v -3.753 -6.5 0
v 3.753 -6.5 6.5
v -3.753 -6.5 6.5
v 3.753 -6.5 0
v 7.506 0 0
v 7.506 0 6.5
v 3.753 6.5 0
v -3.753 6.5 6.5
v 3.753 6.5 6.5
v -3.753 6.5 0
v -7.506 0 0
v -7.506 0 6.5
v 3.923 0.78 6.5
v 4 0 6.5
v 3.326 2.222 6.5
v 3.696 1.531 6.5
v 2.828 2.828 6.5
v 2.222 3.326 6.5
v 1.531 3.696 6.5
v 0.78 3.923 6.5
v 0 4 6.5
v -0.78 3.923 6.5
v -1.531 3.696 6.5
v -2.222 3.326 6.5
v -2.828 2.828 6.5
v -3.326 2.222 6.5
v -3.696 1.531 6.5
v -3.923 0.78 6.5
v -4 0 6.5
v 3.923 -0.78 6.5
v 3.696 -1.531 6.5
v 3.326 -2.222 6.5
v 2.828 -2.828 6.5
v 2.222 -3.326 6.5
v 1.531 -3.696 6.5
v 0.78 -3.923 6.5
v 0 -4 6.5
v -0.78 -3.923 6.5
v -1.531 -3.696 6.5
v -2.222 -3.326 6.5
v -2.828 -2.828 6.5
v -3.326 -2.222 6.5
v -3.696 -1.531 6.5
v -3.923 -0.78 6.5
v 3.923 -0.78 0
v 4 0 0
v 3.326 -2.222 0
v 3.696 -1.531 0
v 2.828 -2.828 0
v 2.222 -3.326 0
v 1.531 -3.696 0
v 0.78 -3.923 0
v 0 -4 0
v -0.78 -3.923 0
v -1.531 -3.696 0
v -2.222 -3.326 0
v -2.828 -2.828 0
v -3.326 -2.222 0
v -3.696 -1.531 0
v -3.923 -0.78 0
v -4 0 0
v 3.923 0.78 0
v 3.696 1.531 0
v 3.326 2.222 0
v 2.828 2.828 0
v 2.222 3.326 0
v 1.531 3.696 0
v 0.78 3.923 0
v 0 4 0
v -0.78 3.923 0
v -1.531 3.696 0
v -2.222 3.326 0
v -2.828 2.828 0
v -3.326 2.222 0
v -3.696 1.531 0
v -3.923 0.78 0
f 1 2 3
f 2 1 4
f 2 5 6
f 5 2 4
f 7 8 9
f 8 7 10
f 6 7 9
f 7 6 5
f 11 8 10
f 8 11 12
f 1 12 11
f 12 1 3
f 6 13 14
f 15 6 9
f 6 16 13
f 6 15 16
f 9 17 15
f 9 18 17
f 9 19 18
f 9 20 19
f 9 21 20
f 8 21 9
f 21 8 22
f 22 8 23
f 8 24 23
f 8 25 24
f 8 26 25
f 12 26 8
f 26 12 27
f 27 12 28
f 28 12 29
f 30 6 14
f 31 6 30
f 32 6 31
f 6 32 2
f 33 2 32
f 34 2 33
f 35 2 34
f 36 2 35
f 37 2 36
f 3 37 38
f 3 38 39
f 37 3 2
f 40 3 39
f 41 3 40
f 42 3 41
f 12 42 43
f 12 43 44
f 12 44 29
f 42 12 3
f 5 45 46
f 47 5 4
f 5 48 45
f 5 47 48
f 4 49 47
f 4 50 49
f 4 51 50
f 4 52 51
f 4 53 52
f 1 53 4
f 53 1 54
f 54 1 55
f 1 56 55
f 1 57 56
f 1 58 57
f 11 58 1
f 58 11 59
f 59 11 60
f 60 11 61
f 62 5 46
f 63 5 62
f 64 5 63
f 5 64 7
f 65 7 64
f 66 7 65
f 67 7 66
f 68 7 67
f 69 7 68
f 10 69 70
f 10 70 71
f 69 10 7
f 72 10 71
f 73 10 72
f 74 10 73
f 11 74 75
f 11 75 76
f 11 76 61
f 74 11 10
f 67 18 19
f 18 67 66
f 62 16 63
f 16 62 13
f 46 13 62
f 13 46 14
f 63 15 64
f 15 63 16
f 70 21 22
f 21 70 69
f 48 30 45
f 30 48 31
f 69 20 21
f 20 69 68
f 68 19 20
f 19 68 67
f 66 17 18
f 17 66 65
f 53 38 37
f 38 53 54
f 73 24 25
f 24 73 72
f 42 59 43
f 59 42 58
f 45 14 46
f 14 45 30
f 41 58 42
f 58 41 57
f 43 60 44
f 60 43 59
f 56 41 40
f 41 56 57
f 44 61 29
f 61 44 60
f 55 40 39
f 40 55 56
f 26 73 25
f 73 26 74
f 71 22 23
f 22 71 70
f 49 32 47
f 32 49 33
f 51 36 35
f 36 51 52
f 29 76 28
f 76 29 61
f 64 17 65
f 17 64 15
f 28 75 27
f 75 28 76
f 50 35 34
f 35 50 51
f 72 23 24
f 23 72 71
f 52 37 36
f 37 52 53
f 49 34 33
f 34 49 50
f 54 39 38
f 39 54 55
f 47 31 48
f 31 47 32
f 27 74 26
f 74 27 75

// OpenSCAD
// Purchased hardware envelope; no modeled threads, not print.
$fn=32;
difference(){cylinder(d=13/cos(30),h=6.5,$fn=6);translate([0,0,-1])cylinder(d=8,h=8.5);}
